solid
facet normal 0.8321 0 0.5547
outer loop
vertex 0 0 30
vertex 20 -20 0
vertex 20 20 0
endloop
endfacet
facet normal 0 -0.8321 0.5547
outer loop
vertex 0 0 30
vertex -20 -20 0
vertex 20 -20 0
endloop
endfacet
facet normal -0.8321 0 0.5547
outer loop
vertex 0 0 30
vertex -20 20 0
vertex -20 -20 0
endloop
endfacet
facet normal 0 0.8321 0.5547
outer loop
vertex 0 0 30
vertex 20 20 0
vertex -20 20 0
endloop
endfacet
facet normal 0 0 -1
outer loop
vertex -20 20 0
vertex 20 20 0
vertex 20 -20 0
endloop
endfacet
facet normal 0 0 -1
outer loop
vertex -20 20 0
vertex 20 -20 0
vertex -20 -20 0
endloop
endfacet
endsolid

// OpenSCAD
z=0; 
a=5;  k=-5;
b=10; l=-10;
c=15; m=-15;
d=20; n=-20;
e=25; o=-25;
f=30; p=-30;
g=35; q=-35;
h=40; r=-40;
i=45; s=-45;
j=50; t=-50;
polyhedron(
points=[ [d,d,z],[d,n,z],[n,n,z],[n,d,z],
[z,z,f] ],
faces=[ [0,1,4],[1,2,4],[2,3,4],[3,0,4],[1,0,3],[2,1,3] ]
);
